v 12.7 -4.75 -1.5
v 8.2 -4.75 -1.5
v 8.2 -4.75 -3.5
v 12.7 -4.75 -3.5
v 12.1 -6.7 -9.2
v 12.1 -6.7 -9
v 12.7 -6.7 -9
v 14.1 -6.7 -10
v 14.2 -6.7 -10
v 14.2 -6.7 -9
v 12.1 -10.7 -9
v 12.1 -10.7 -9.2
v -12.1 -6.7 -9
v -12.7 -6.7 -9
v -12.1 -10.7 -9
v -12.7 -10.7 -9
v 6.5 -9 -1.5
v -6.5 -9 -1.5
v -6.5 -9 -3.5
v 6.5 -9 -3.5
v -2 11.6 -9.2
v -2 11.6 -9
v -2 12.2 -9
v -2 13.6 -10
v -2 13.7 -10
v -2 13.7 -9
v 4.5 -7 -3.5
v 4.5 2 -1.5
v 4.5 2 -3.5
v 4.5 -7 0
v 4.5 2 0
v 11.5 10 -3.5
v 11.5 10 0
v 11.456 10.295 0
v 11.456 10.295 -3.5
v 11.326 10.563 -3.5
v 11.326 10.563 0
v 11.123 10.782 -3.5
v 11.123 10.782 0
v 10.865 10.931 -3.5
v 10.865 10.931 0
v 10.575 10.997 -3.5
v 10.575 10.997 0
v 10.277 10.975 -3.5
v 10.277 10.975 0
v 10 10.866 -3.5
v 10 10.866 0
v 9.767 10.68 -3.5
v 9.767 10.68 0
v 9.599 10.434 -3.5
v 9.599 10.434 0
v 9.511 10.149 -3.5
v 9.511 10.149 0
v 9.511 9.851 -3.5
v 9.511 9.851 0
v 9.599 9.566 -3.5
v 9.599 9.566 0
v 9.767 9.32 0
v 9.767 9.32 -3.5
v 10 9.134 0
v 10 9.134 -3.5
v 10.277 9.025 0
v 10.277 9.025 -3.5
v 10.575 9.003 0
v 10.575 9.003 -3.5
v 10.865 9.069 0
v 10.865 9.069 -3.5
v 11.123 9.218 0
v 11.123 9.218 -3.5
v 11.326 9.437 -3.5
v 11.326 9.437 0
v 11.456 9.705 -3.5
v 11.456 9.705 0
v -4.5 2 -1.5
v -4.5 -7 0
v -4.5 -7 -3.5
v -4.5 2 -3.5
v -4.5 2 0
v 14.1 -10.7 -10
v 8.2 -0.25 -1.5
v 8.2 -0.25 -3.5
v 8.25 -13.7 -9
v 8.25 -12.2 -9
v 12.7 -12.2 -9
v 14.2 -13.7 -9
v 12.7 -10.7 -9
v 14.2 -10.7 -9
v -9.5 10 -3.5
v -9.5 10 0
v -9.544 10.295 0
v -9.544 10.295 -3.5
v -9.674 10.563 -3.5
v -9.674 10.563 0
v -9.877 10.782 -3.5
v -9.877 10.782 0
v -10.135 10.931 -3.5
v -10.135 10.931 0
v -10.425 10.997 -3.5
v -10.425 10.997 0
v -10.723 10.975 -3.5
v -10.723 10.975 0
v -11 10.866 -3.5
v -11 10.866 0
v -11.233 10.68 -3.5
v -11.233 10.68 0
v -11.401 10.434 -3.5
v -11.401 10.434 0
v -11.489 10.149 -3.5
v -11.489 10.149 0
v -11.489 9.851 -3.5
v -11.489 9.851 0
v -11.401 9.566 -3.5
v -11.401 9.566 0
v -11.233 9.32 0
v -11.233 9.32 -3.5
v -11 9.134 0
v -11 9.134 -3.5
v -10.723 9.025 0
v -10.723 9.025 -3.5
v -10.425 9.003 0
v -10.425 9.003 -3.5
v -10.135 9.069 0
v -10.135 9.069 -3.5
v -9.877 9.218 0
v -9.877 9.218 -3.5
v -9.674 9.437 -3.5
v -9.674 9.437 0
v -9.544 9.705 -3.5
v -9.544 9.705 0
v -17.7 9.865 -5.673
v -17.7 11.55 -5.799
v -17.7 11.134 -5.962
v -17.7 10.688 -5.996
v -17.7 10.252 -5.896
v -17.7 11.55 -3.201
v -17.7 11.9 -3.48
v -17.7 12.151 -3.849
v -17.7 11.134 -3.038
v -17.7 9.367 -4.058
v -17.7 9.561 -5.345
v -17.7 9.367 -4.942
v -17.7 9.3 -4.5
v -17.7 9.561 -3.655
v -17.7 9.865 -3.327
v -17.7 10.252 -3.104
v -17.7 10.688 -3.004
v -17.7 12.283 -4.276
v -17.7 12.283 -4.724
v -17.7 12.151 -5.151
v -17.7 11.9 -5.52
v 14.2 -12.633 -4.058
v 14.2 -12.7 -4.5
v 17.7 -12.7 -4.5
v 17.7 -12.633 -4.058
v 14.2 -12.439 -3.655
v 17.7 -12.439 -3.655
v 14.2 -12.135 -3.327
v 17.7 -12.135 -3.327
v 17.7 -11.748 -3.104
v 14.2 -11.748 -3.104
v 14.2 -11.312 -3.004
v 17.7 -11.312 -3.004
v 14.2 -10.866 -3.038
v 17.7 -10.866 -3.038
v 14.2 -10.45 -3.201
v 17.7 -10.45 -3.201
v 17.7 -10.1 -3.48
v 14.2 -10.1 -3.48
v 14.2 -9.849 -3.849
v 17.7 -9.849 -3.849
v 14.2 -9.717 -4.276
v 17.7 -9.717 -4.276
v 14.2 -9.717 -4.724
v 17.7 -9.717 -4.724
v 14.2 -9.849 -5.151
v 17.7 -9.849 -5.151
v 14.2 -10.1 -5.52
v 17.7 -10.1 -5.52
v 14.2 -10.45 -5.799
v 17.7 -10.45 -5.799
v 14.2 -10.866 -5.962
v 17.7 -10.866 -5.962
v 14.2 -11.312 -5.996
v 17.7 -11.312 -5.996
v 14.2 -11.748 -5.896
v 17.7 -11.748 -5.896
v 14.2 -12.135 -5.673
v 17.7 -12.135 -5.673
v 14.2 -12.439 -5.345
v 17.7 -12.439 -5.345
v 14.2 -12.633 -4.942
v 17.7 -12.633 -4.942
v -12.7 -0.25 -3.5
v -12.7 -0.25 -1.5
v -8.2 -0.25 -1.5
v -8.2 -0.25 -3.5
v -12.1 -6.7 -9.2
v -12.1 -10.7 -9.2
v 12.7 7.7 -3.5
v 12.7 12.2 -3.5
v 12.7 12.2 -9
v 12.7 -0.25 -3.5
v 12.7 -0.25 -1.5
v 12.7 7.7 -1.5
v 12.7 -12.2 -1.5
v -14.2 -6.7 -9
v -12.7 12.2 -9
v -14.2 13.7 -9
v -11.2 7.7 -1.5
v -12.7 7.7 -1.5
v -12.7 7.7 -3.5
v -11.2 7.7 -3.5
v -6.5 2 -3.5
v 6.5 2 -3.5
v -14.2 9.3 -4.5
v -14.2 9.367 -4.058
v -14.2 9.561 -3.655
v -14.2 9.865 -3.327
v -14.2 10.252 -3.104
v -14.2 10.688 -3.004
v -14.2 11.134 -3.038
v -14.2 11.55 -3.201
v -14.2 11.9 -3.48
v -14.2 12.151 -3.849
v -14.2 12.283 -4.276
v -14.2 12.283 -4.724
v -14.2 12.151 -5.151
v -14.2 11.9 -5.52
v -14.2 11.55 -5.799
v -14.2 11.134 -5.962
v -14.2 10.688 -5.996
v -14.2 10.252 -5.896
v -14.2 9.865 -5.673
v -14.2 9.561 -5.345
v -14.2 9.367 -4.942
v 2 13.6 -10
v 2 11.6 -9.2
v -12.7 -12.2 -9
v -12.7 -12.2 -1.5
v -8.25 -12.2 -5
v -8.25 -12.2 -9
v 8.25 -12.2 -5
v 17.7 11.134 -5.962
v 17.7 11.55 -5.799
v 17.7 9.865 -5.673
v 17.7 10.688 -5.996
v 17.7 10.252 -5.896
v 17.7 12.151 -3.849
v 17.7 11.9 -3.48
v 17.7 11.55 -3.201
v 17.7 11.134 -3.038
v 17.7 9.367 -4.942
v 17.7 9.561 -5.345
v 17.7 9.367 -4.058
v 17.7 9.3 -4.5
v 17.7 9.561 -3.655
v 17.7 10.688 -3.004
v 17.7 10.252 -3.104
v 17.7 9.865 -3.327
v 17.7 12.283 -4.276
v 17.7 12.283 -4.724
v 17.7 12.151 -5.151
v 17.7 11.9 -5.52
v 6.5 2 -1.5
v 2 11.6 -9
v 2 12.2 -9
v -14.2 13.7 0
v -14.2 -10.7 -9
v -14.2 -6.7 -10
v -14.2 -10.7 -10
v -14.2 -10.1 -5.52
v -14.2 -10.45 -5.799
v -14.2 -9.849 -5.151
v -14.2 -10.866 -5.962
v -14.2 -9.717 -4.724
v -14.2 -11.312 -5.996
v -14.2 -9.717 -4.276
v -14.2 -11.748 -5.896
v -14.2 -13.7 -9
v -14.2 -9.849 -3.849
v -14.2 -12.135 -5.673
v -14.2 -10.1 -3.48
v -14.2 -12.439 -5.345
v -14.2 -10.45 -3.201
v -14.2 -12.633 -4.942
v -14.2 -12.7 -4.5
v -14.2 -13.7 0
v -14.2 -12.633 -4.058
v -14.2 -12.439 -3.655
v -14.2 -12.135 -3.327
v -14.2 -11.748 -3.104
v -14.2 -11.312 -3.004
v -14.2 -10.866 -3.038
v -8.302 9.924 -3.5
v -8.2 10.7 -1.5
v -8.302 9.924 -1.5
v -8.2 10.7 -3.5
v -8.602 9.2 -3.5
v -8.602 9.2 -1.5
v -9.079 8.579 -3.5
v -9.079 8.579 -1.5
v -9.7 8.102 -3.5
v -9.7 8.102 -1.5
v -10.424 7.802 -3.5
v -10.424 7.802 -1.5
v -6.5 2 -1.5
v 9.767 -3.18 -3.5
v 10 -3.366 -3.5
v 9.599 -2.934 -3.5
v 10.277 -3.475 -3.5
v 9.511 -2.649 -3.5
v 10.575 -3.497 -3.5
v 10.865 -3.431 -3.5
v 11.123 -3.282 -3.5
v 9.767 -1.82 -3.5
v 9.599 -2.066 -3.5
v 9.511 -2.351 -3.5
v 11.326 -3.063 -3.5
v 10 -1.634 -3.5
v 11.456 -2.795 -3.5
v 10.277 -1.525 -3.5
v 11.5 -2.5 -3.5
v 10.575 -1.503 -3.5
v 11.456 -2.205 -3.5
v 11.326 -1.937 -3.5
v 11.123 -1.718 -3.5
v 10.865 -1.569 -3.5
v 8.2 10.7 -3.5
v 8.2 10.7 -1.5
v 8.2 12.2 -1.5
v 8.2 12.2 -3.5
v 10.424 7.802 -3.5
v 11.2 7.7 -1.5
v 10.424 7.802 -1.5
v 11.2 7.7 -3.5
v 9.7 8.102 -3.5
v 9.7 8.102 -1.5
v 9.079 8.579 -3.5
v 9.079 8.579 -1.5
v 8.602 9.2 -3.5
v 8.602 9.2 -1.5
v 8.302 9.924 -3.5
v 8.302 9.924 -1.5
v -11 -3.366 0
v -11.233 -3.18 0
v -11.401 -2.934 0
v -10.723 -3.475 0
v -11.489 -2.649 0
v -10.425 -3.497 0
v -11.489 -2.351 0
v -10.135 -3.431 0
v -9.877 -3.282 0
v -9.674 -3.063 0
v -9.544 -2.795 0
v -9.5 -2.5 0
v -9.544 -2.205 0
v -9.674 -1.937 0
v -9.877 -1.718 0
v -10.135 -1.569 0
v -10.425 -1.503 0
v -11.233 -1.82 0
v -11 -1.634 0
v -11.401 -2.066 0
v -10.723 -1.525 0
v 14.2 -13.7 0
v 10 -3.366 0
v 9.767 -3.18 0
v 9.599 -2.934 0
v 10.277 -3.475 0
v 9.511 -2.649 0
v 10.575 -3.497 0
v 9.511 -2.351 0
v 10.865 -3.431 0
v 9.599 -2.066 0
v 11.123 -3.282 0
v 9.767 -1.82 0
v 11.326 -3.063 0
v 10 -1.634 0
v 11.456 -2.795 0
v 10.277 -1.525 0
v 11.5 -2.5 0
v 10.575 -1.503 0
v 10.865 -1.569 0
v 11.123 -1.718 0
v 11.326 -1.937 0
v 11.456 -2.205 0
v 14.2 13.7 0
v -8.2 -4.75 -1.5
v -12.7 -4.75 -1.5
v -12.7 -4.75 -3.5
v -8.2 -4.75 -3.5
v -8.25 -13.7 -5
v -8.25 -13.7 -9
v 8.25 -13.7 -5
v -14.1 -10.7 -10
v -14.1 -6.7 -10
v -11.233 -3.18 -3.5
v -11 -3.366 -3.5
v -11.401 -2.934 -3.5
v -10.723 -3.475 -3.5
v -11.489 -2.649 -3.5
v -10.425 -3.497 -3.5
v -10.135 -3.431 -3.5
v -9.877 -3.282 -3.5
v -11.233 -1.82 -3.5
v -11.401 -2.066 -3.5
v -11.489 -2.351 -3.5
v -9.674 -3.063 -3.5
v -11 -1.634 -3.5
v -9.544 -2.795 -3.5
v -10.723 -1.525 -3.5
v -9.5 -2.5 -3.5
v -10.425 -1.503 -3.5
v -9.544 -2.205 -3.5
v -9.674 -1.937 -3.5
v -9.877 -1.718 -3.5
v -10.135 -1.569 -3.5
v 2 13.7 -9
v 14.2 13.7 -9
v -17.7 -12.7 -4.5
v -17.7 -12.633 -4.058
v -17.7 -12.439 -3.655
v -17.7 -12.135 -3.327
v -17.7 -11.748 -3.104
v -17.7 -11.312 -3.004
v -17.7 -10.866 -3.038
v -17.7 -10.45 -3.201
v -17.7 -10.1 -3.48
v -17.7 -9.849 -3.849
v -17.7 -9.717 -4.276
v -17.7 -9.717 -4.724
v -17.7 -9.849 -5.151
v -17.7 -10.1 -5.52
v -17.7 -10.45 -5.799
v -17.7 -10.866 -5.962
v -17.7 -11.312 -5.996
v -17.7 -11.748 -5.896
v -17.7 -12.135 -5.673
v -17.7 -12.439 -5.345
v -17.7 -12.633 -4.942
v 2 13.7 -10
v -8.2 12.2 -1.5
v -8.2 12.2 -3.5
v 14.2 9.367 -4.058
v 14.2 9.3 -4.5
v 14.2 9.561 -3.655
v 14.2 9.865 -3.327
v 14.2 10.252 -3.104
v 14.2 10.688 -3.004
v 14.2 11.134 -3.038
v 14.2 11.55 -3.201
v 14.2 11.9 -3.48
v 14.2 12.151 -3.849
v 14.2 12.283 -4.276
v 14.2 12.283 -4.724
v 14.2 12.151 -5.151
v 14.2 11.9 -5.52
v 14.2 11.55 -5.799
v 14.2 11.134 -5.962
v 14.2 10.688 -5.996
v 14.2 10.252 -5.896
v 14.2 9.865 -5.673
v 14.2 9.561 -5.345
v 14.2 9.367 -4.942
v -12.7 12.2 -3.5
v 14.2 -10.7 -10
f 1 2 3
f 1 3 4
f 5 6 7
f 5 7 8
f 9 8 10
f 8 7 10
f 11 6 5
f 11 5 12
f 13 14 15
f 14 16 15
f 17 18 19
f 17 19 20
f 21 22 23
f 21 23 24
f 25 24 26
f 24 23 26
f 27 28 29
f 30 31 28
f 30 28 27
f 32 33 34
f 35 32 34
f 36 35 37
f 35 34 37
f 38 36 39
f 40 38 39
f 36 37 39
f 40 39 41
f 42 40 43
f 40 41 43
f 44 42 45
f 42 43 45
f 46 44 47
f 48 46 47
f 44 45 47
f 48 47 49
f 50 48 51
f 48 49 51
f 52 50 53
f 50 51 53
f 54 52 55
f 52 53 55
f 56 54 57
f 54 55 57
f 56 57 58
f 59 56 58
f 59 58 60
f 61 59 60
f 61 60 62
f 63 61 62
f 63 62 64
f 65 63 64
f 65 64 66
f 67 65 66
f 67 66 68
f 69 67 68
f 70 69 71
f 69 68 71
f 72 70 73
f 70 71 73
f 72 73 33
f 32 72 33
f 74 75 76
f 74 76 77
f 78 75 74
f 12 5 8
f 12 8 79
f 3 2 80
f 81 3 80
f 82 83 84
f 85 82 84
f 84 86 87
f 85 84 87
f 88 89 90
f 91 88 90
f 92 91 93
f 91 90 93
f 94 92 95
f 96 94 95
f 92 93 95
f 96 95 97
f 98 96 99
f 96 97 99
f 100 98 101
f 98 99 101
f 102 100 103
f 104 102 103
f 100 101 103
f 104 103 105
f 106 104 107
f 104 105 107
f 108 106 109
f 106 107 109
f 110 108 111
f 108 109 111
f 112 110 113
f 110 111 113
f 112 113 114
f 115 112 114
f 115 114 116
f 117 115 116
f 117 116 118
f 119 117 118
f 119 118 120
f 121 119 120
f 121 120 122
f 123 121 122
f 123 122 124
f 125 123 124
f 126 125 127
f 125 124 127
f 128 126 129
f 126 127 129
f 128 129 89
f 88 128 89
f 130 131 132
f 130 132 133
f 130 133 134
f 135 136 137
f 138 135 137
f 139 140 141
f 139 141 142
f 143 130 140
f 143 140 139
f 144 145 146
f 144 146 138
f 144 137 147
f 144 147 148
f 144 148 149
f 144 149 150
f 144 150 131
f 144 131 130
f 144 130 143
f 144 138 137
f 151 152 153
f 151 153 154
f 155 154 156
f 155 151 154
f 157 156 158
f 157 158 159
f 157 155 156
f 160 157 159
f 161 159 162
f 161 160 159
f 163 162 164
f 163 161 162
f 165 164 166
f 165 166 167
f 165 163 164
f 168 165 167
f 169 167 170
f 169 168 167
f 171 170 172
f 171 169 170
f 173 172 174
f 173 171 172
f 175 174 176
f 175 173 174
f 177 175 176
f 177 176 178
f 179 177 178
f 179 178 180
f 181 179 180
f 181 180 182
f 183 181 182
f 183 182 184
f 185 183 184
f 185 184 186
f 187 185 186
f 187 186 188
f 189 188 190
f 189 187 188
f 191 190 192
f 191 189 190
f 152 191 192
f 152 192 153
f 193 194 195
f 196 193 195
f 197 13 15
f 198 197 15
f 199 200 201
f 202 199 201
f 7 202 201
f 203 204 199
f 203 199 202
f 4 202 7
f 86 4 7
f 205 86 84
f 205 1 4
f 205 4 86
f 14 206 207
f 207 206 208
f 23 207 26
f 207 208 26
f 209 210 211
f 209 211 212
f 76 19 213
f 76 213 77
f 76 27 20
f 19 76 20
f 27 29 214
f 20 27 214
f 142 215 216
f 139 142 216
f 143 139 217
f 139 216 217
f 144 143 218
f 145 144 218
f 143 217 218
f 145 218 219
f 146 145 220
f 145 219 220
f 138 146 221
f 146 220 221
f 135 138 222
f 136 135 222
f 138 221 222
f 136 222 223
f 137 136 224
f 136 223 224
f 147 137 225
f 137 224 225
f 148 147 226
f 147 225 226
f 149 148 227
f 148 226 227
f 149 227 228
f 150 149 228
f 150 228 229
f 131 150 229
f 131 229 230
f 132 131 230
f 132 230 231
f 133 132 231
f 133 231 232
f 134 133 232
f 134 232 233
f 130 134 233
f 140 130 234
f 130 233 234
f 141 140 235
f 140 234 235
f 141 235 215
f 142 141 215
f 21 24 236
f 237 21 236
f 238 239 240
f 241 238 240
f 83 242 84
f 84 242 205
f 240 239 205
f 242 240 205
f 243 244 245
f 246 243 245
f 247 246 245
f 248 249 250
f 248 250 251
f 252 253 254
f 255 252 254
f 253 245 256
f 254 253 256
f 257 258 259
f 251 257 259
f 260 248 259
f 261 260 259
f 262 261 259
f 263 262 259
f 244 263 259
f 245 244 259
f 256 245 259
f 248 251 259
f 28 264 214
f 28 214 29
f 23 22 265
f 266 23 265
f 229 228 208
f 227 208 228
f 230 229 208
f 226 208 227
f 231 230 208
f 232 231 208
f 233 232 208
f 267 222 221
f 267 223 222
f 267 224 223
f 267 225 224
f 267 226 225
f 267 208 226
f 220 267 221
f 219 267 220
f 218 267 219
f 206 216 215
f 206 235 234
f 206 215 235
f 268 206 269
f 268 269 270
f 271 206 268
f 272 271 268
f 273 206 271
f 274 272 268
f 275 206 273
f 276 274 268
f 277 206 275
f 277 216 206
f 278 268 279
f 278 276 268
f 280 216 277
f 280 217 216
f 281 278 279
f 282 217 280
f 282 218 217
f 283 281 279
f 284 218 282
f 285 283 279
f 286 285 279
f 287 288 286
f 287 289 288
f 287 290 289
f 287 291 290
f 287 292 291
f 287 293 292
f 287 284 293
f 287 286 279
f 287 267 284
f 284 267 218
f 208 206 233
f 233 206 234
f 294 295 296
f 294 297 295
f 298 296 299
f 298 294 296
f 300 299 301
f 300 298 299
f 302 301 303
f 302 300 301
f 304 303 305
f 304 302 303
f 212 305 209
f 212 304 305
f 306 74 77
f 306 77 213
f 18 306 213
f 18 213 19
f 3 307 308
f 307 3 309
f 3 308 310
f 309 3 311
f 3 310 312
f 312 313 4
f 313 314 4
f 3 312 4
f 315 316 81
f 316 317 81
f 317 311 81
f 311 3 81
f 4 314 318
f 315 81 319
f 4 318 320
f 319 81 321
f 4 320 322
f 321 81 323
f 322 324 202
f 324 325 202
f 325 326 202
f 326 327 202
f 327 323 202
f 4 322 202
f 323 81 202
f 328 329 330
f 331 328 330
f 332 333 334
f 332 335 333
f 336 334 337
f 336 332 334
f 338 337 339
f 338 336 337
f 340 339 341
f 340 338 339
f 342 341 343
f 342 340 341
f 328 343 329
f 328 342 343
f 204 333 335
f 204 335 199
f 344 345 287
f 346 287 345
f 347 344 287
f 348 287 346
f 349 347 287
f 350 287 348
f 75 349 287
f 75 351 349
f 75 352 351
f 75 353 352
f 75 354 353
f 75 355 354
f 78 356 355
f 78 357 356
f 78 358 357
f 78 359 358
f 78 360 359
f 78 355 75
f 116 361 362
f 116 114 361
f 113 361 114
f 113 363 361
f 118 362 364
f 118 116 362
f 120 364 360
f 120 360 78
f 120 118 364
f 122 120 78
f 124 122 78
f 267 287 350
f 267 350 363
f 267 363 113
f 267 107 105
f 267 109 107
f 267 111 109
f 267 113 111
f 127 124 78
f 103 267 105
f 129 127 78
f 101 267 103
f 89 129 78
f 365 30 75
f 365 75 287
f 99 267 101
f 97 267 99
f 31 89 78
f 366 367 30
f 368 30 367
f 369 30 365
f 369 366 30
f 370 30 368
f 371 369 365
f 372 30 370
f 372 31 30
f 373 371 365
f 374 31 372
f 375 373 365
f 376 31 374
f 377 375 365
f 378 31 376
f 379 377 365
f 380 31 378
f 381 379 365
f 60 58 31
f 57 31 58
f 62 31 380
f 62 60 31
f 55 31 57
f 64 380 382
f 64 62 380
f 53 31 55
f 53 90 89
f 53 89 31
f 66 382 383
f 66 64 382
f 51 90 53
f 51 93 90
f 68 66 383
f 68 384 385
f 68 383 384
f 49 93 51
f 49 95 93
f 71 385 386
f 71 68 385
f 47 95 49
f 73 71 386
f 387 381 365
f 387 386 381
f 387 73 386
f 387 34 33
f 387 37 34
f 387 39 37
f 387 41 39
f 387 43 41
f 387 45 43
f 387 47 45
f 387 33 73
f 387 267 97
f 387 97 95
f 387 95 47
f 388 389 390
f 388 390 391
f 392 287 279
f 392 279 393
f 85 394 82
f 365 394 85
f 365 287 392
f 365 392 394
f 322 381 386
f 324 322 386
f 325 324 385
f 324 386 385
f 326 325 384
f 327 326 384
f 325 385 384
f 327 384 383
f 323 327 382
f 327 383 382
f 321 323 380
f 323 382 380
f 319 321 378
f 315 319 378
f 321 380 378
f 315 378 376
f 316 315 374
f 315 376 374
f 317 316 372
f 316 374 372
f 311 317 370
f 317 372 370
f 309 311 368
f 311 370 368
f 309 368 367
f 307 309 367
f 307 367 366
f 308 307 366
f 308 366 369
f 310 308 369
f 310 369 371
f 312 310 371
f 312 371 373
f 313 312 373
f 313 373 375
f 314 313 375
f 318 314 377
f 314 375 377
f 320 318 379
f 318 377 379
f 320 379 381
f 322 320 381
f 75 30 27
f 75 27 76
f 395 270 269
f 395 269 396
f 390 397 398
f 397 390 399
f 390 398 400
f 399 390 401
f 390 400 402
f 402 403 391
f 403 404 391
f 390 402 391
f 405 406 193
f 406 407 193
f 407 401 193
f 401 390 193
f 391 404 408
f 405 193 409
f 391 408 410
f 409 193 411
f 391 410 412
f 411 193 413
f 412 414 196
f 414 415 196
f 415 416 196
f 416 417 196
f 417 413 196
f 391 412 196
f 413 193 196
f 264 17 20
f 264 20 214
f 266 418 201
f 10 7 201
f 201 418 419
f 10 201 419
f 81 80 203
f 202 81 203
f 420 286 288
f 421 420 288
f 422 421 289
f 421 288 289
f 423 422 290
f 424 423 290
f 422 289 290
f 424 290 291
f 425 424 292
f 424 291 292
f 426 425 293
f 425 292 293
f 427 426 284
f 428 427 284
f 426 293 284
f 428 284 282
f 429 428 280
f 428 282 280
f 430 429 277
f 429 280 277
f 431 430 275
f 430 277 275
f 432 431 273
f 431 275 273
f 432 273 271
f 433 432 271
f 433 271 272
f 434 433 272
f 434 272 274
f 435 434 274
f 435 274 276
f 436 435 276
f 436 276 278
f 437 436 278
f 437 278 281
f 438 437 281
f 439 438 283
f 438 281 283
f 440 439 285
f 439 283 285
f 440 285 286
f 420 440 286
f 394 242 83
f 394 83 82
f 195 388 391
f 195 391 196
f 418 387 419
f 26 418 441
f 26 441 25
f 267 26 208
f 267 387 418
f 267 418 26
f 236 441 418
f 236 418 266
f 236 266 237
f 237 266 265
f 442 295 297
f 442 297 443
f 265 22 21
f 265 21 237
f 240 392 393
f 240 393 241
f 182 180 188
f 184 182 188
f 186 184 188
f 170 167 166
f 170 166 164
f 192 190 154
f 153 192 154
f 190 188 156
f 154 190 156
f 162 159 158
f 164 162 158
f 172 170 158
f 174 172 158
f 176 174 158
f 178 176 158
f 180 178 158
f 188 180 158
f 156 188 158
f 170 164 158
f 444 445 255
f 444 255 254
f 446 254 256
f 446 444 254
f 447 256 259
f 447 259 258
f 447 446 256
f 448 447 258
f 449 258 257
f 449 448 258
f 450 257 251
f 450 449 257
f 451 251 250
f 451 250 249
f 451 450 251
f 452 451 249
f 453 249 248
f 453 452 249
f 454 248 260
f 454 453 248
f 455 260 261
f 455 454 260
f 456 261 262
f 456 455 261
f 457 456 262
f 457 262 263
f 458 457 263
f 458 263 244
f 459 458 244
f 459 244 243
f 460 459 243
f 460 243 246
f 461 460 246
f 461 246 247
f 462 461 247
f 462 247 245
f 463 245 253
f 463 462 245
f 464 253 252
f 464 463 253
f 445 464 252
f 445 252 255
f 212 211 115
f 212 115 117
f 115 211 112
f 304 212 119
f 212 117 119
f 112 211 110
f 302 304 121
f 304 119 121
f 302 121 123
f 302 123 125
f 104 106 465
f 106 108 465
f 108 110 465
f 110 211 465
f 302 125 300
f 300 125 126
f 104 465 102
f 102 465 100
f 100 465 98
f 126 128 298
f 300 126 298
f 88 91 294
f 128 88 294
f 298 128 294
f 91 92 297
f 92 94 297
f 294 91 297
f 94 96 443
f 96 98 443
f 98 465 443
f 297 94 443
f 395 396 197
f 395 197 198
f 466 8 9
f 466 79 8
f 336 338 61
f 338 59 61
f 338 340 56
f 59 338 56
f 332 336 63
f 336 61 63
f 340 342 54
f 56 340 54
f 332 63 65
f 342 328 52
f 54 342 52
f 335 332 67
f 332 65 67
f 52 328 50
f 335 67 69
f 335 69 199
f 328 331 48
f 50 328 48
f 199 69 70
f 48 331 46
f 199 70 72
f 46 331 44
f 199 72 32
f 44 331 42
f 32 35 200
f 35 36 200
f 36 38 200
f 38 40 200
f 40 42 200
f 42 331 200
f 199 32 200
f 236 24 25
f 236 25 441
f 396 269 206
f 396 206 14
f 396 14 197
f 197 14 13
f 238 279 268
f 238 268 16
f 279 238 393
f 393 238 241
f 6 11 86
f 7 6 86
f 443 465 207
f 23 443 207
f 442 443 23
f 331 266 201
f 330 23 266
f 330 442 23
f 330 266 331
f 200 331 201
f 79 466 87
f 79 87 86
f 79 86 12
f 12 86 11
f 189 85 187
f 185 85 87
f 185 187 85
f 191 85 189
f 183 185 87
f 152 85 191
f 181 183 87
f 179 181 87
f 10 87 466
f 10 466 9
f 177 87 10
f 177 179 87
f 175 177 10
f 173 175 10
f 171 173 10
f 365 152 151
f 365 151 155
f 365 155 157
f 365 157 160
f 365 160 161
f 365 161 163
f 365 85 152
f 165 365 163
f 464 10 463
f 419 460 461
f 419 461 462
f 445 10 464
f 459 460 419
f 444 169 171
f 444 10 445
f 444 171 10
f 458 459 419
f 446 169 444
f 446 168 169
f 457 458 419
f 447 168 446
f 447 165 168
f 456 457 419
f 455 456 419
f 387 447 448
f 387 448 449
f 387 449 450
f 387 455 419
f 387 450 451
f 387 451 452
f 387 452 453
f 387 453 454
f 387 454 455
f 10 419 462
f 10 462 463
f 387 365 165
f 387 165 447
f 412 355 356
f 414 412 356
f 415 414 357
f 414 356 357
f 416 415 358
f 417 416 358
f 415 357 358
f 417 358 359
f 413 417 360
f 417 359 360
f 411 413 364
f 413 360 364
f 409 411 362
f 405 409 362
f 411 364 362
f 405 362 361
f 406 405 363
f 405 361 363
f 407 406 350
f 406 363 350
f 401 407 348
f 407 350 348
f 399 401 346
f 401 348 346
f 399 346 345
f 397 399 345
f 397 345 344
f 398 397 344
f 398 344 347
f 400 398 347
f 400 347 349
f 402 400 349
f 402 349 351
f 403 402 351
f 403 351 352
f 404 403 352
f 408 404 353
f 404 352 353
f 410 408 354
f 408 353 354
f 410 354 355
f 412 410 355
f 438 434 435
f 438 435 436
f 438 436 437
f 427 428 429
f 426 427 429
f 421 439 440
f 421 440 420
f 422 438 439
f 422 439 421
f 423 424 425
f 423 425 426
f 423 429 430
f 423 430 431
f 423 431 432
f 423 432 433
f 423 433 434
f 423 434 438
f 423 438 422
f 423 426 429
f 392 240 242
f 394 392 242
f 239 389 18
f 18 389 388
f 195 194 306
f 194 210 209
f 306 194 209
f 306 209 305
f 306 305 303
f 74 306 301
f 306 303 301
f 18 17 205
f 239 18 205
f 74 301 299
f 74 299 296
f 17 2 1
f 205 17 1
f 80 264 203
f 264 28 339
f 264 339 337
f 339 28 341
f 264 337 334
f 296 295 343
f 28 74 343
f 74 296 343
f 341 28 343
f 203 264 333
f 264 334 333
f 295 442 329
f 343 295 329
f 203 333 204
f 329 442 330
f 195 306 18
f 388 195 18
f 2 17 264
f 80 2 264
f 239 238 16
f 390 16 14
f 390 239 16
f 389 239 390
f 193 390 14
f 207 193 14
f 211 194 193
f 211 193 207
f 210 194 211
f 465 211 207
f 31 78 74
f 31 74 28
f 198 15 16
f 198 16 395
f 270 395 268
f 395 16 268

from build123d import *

# Parameters (mm, degrees)
F1_DEPTH    = 1.5
F2_DEPTH    = 9
F0_W        = 4.5
F0_H        = 4.5
F0_R        = 1
F3_DEPTH    = 3.5
F0_W_2      = 16.5
F0_H_2      = 1.5
F4_DEPTH    = 5
F5_R        = 1.5
F6_DEPTH    = 3.5
F8_R        = 3
F9_W        = 0.6
F9_H        = 4
F9_W_2      = 1.5
F9_W_3      = 4
F9_H_2      = 0.6
F9_H_3      = 1.5
F10_DEPTH   = 1
F11_SIZE2   = 2
F11_SIZE    = 0.8
F11_2_SIZE2 = 2
F11_2_SIZE  = 0.8
F12_SIZE2   = 0.8
F12_SIZE    = 2


# Not quite as in the source:
# - a feature names something its author has since deleted; it is built from what else it names


with BuildPart() as f1:
    # F0 (on Top) → F1 (new body)
    with BuildSketch(Plane.XY):
        Polygon((8.2, 12.2), (-8.2, 12.2), (-8.2, 7.7), (-12.7, 7.7), (-12.7, -0.25), (-8.2, -0.25), (-8.2, -4.75), (-12.7, -4.75), (-12.7, -12.2), (-8.25, -12.2), (8.25, -12.2), (12.7, -12.2), (12.7, -4.75), (8.2, -4.75), (8.2, -0.25), (12.7, -0.25), (12.7, 7.7), (8.2, 7.7), align=None)
        Polygon((-6.5, 2), (-4.5, 2), (4.5, 2), (6.5, 2), (6.5, -9), (-6.5, -9), align=None, mode=Mode.SUBTRACT)
    extrude(amount=-F1_DEPTH)



with BuildPart() as f2:
    # F0 (on Top) → F2 (new body)
    with BuildSketch(Plane.XY):
        Polygon((-12.7, 7.7), (-12.7, 12.2), (-8.2, 12.2), (8.2, 12.2), (12.7, 12.2), (12.7, 7.7), (12.7, -0.25), (12.7, -4.75), (12.7, -12.2), (8.25, -12.2), (8.25, -13.7), (14.2, -13.7), (14.2, 13.7), (-14.2, 13.7), (-14.2, -13.7), (-8.25, -13.7), (-8.25, -12.2), (-12.7, -12.2), (-12.7, -4.75), (-12.7, -0.25), align=None)
    extrude(amount=-F2_DEPTH)


with BuildPart() as f3:
    # F0 (on Top) → F3 (new body)
    with BuildSketch(Plane.XY):
        with Locations((10.45, 9.95)):
            Rectangle(F0_W, F0_H)
        with Locations((10.5, 10)):
            Circle(F0_R, mode=Mode.SUBTRACT)
    extrude(amount=-F3_DEPTH)


with BuildPart() as f3b:
    # F0 (on Top) → F3, piece 2 (new body)
    with BuildSketch(Plane.XY):
        with Locations((10.45, -2.5)):
            Rectangle(F0_W, F0_H)
        with Locations((10.5, -2.5)):
            Circle(F0_R, mode=Mode.SUBTRACT)
    extrude(amount=-F3_DEPTH)


with BuildPart() as f3c:
    # F0 (on Top) → F3, piece 3 (new body)
    with BuildSketch(Plane.XY):
        Polygon((-4.5, -7), (-4.5, 2), (-6.5, 2), (-6.5, -9), (6.5, -9), (6.5, 2), (4.5, 2), (4.5, -7), align=None)
    extrude(amount=-F3_DEPTH)


with BuildPart() as f3d:
    # F0 (on Top) → F3, piece 4 (new body)
    with BuildSketch(Plane.XY):
        with Locations((-10.45, 9.95)):
            Rectangle(F0_W, F0_H)
        with Locations((-10.5, 10)):
            Circle(F0_R, mode=Mode.SUBTRACT)
    extrude(amount=-F3_DEPTH)


with BuildPart() as f3e:
    # F0 (on Top) → F3, piece 5 (new body)
    with BuildSketch(Plane.XY):
        with Locations((-10.45, -2.5)):
            Rectangle(F0_W, F0_H)
        with Locations((-10.5, -2.5)):
            Circle(F0_R, mode=Mode.SUBTRACT)
    extrude(amount=-F3_DEPTH)


with BuildPart() as f1_1:
    add(f1.part)

    add(f2.part)  # F4 merges F2
    # F0 (on Top) → F4 (join)
    with BuildSketch(Plane.XY):
        with Locations((0, -12.95)):
            Rectangle(F0_W_2, F0_H_2)
    extrude(amount=-F4_DEPTH)

    # F5 (on face) → F6 (join)
    with BuildSketch(Plane(origin=(-14.2, 0, 0), x_dir=(0, -1, 0), z_dir=(-1, 0, 0))):
        with Locations((11.2, -4.5)):
            Circle(F5_R)
        with Locations((-10.8, -4.5)):
            Circle(F5_R)
    extrude(amount=F6_DEPTH)



with BuildPart() as f1_2:
    add(f1_1.part)

    add(f3.part)  # F7 merges F3

    add(f3b.part)  # F7 merges F3b

    add(f3c.part)  # F7 merges F3c

    add(f3d.part)  # F7 merges F3d

    add(f3e.part)  # F7 merges F3e
    # F7: F1 across plane
    add(f1_1.part.mirror(Plane.YZ))

    # F8
    f8_edges = [f1_2.edges().sort_by_distance(p)[0] for p in [
        (8.2, 7.7, -2.5),
        (-8.2, 7.7, -2.5),
    ]]
    fillet(f8_edges, radius=F8_R)

    # F9 (on face) → F10 (join)
    with BuildSketch(Plane(origin=(0, 0, -9), x_dir=(1, 0, 0), z_dir=(0, 0, -1))):
        with Locations((-12.4, 8.7)):
            Rectangle(F9_W, F9_H)
        with Locations((-13.45, 8.7)):
            Rectangle(F9_W_2, F9_H)
        with Locations((12.4, 8.7)):
            Rectangle(F9_W, F9_H)
        with Locations((13.45, 8.7)):
            Rectangle(F9_W_2, F9_H)
        with Locations((0, -11.9)):
            Rectangle(F9_W_3, F9_H_2)
        with Locations((0, -12.95)):
            Rectangle(F9_W_3, F9_H_3)
    extrude(amount=F10_DEPTH)

    # F11
    f11_edges = [f1_2.edges().sort_by_distance(p)[0] for p in [
        (-12.1, -8.7, -10),
    ]]
    f11_side = f1_2.faces().sort_by_distance((-12.1, -8.7, -9.5))[0]
    chamfer(f11_edges, length=F11_SIZE, length2=F11_SIZE2, reference=f11_side)

    # F11#2
    f11_2_edges = [f1_2.edges().sort_by_distance(p)[0] for p in [
        (0, 11.6, -10),
    ]]
    f11_2_side = f1_2.faces().sort_by_distance((0, 11.6, -9.5))[0]
    chamfer(f11_2_edges, length=F11_2_SIZE, length2=F11_2_SIZE2, reference=f11_2_side)

    # F12
    f12_edges = [f1_2.edges().sort_by_distance(p)[0] for p in [
        (12.1, -8.7, -10),
    ]]
    f12_side = f1_2.faces().sort_by_distance((13.15, -8.7, -10))[0]
    chamfer(f12_edges, length=F12_SIZE, length2=F12_SIZE2, reference=f12_side)


solid = f1_2.part
